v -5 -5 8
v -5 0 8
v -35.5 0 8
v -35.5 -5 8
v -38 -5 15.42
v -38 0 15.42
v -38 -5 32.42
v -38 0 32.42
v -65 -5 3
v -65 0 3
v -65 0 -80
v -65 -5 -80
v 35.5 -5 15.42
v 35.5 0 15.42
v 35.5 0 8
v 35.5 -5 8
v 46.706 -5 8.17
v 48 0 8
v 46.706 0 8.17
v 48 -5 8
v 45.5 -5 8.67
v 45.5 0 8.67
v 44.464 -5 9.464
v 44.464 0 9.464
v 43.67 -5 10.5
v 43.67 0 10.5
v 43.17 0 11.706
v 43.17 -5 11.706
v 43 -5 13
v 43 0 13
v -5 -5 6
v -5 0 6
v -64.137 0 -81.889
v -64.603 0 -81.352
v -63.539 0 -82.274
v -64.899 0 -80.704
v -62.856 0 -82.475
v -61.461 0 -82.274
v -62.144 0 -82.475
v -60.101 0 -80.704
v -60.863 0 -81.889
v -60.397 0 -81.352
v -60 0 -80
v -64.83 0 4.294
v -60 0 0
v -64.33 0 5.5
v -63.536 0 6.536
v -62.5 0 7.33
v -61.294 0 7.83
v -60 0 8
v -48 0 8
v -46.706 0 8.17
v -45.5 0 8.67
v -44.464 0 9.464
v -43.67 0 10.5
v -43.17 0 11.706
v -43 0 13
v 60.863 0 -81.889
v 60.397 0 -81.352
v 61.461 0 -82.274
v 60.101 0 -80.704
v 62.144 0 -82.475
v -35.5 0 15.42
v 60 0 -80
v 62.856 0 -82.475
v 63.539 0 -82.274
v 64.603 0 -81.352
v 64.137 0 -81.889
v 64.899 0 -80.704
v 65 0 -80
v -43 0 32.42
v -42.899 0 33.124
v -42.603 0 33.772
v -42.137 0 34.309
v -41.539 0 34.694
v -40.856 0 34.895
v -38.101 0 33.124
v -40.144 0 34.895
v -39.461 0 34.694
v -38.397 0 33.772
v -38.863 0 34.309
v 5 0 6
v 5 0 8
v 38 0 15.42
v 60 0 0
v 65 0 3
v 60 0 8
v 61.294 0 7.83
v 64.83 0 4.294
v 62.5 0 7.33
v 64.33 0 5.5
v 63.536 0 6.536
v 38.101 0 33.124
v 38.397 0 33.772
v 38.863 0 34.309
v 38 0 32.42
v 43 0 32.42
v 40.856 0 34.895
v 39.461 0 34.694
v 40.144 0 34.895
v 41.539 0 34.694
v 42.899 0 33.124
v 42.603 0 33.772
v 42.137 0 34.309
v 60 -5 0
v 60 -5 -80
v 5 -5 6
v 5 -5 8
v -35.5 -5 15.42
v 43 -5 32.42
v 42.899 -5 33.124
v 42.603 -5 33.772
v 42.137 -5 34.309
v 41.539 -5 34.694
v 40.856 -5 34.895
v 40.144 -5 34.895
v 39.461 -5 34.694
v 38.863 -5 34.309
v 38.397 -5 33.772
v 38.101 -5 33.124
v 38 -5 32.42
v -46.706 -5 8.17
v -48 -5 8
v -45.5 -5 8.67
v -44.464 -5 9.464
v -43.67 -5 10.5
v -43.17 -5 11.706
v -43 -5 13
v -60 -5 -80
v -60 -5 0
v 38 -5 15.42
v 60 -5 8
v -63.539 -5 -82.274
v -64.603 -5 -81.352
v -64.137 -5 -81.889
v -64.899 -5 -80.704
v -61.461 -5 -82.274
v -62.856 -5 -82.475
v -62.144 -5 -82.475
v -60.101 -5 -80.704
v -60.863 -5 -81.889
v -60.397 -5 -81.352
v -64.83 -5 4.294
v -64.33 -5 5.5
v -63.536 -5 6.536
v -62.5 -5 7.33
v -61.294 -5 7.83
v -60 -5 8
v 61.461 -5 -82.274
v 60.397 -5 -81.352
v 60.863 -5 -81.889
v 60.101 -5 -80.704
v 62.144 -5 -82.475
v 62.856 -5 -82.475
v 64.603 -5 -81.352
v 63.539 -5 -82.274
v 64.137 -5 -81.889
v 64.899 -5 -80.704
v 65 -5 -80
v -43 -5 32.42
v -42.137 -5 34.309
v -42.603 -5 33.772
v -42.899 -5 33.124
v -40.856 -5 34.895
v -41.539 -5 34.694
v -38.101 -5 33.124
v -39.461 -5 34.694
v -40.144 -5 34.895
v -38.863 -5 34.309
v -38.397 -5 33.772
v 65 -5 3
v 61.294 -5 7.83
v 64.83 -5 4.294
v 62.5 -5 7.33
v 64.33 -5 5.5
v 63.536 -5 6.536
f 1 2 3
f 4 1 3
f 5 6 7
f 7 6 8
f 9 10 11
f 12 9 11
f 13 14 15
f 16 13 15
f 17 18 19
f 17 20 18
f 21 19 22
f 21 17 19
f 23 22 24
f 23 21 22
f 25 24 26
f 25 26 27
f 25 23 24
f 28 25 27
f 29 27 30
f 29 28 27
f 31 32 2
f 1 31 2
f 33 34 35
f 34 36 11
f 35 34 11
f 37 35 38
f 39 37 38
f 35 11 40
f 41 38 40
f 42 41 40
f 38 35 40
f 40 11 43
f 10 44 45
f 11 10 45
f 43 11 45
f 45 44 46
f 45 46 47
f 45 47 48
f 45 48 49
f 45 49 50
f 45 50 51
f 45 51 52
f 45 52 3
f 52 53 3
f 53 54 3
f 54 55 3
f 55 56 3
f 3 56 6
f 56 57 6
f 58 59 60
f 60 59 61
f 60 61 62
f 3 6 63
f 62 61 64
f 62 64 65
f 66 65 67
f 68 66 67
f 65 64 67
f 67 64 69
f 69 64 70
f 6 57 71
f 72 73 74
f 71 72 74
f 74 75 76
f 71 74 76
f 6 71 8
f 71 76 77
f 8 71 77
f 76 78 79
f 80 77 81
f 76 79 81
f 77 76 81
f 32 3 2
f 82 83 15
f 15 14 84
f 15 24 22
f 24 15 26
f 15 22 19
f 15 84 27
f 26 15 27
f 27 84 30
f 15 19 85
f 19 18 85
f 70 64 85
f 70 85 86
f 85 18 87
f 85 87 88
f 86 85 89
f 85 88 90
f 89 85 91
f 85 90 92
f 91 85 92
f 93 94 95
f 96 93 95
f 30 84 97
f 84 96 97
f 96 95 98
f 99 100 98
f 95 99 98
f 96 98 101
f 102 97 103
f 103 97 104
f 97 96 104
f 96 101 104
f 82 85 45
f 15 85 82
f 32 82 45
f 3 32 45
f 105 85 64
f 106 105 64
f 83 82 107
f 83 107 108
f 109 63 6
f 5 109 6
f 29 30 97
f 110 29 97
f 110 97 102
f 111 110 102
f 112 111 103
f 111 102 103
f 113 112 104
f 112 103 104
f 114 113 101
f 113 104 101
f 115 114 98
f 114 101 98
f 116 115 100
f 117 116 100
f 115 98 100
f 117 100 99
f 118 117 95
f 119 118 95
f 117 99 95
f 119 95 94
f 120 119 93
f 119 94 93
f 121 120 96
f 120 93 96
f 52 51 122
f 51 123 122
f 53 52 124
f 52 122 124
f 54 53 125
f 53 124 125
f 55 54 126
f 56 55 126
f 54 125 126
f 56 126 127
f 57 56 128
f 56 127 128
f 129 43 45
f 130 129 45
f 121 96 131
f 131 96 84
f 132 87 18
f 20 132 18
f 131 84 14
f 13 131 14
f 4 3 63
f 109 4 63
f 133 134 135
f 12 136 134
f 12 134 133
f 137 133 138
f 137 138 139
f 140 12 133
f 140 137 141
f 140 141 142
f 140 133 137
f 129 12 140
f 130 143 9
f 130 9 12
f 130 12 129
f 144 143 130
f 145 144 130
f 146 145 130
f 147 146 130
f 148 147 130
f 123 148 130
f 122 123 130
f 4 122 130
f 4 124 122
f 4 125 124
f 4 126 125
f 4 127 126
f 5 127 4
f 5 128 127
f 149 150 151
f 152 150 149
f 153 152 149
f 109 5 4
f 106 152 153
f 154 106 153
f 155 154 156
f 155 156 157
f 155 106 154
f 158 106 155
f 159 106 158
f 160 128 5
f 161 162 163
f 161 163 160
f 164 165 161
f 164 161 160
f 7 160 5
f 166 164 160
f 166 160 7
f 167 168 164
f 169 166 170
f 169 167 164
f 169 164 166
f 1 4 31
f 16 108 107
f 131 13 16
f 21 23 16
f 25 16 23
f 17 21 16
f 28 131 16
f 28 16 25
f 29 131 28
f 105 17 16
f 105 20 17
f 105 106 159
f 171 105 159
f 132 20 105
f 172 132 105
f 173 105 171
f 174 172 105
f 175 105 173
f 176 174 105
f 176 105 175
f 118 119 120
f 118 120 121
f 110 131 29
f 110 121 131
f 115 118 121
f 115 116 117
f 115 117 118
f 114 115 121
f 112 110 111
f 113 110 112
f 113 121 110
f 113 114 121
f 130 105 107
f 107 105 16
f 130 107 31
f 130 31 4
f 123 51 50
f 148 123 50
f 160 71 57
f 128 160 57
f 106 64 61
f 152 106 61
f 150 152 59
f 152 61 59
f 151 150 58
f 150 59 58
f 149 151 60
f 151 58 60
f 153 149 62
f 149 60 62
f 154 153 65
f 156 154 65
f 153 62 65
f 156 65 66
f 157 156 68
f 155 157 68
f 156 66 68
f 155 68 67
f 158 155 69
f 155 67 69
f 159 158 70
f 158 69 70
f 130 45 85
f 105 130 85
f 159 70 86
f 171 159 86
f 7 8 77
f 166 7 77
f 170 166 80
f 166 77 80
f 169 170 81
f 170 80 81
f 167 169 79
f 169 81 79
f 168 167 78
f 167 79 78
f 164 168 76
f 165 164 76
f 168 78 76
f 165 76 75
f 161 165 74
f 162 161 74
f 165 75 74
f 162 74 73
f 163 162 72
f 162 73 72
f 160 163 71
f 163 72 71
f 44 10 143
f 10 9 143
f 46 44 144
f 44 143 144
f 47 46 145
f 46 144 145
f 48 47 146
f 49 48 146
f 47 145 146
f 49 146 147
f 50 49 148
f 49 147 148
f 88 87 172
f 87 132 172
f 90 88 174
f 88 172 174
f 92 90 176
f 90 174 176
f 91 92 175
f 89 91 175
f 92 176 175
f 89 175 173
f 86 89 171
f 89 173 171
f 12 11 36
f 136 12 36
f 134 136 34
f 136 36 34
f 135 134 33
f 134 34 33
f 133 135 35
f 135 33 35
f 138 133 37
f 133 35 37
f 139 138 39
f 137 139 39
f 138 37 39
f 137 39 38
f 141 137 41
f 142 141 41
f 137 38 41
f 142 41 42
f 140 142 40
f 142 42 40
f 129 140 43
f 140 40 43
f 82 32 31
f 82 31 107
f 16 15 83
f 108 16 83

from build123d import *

# Parameters (mm, degrees)
F1_DEPTH = 5
F2_W     = 10
F2_H     = 4
F3_DEPTH = 25
F4_R     = 5
F5_R     = 5


with BuildPart() as f1:
    # F0 (on Front) → F1 (new body)
    with BuildSketch(Plane.XZ):
        with BuildLine():
            Line((-60, -80), (-60, 0))
            Line((-60, 0), (0, 0))
            Line((0, 0), (60, 0))
            Line((60, 0), (60, -80))
            ThreePointArc((60, -80), (62.5, -82.5), (65, -80))
            Line((65, -80), (65, 8))
            Line((65, 8), (60, 8))
            Line((60, 8), (43, 8))
            Line((43, 8), (43, 32.420063))
            ThreePointArc((43, 32.420063), (40.5, 34.920063), (38, 32.420063))
            Line((38, 32.420063), (38, 15.420063))
            Line((38, 15.420063), (35.5, 15.420063))
            Line((35.5, 15.420063), (35.5, 8))
            Line((35.5, 8), (0, 8))
            Line((0, 8), (-35.5, 8))
            Line((-35.5, 8), (-35.5, 15.420063))
            Line((-35.5, 15.420063), (-38, 15.420063))
            Line((-38, 15.420063), (-38, 32.420063))
            ThreePointArc((-38, 32.420063), (-40.5, 34.920063), (-43, 32.420063))
            Line((-43, 32.420063), (-43, 8))
            Line((-43, 8), (-60, 8))
            Line((-60, 8), (-65, 8))
            Line((-65, 8), (-65, -80))
            ThreePointArc((-65, -80), (-62.5, -82.5), (-60, -80))
        make_face()
    extrude(amount=F1_DEPTH)

    # F2 (on Front) → F3 (cut)
    with BuildSketch(Plane.XZ):
        with Locations((0, 8)):
            Rectangle(F2_W, F2_H)
    extrude(amount=F3_DEPTH, mode=Mode.SUBTRACT)

    # F4
    f4_edges = [f1.edges().sort_by_distance(p)[0] for p in [
        (-65, -2.5, 8),
        (65, -2.5, 8),
    ]]
    fillet(f4_edges, radius=F4_R)

    # F5
    f5_edges = [f1.edges().sort_by_distance(p)[0] for p in [
        (-43, -2.5, 8),
        (43, -2.5, 8),
    ]]
    fillet(f5_edges, radius=F5_R)


solid = f1.part
